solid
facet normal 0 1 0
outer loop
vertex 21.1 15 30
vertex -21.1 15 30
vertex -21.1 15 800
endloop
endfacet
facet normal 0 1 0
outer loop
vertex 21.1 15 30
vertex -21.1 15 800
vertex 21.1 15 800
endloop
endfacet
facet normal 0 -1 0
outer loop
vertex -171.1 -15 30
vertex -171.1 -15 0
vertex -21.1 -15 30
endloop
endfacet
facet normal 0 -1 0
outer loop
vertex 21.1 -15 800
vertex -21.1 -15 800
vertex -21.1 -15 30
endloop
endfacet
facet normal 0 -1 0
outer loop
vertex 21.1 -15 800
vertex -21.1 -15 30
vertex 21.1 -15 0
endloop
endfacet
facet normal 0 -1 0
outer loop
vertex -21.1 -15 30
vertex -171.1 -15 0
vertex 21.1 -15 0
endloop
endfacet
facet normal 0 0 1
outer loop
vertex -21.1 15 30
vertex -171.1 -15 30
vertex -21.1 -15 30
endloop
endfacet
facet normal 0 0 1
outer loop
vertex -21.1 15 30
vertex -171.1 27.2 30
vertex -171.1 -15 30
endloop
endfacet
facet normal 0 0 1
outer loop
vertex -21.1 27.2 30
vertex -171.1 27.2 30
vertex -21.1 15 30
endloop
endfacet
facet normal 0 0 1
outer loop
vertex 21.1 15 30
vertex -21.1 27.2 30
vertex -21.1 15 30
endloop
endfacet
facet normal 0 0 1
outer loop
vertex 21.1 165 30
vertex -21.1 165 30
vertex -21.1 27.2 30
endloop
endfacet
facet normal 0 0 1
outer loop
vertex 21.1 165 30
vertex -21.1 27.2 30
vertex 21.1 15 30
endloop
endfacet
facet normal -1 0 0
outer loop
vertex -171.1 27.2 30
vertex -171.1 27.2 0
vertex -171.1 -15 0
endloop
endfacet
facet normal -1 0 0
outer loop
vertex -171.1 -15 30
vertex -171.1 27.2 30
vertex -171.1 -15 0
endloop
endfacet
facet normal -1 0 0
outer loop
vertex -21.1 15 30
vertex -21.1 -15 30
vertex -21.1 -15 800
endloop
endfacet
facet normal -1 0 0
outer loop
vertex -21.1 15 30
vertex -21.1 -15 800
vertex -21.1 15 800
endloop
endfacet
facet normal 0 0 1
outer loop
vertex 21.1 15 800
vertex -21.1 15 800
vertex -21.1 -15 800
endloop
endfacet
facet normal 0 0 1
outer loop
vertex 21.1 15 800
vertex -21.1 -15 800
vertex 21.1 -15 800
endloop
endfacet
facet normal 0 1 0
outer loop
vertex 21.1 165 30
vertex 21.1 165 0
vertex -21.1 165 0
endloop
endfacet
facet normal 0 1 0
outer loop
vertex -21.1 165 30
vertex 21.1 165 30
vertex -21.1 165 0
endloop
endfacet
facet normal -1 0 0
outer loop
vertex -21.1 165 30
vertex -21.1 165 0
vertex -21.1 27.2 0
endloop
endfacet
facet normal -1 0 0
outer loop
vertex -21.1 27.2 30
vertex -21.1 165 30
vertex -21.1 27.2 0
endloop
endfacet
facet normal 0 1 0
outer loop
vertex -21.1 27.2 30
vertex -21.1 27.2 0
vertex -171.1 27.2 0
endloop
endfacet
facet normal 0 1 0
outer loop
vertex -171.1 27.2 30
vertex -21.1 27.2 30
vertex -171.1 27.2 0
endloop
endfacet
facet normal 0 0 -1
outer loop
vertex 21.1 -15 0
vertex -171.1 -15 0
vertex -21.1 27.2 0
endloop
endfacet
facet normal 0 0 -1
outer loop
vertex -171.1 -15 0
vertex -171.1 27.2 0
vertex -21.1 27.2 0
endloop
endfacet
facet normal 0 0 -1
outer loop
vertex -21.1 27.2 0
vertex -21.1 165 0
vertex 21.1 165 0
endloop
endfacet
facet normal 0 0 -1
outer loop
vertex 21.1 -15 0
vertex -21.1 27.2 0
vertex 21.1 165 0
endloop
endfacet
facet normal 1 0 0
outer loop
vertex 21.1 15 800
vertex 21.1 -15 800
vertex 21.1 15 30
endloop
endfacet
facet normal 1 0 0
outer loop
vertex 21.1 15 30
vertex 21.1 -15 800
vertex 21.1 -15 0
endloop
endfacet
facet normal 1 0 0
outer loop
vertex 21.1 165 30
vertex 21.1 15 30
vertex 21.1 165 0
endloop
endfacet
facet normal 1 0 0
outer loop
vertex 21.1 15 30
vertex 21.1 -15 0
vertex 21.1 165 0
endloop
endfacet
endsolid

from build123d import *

# Parameters (mm, degrees)
F0_W     = 42.2
F0_H     = 30
F1_DEPTH = 800
F2_DEPTH = 30


with BuildPart() as f1:
    # F0 (on Top) → F1 (new body)
    with BuildSketch(Plane.XY):
        Rectangle(F0_W, F0_H)
    extrude(amount=F1_DEPTH)

    # F0 (on Top) → F2 (join)
    with BuildSketch(Plane.XY):
        Polygon((-171.1, -15), (-21.1, -15), (-21.1, 15), (-21.1, 27.2), (-171.1, 27.2), align=None)
        Polygon((-21.1, 15), (21.1, 15), (21.1, 165), (-21.1, 165), (-21.1, 27.2), align=None)
    extrude(amount=F2_DEPTH)


solid = f1.part
